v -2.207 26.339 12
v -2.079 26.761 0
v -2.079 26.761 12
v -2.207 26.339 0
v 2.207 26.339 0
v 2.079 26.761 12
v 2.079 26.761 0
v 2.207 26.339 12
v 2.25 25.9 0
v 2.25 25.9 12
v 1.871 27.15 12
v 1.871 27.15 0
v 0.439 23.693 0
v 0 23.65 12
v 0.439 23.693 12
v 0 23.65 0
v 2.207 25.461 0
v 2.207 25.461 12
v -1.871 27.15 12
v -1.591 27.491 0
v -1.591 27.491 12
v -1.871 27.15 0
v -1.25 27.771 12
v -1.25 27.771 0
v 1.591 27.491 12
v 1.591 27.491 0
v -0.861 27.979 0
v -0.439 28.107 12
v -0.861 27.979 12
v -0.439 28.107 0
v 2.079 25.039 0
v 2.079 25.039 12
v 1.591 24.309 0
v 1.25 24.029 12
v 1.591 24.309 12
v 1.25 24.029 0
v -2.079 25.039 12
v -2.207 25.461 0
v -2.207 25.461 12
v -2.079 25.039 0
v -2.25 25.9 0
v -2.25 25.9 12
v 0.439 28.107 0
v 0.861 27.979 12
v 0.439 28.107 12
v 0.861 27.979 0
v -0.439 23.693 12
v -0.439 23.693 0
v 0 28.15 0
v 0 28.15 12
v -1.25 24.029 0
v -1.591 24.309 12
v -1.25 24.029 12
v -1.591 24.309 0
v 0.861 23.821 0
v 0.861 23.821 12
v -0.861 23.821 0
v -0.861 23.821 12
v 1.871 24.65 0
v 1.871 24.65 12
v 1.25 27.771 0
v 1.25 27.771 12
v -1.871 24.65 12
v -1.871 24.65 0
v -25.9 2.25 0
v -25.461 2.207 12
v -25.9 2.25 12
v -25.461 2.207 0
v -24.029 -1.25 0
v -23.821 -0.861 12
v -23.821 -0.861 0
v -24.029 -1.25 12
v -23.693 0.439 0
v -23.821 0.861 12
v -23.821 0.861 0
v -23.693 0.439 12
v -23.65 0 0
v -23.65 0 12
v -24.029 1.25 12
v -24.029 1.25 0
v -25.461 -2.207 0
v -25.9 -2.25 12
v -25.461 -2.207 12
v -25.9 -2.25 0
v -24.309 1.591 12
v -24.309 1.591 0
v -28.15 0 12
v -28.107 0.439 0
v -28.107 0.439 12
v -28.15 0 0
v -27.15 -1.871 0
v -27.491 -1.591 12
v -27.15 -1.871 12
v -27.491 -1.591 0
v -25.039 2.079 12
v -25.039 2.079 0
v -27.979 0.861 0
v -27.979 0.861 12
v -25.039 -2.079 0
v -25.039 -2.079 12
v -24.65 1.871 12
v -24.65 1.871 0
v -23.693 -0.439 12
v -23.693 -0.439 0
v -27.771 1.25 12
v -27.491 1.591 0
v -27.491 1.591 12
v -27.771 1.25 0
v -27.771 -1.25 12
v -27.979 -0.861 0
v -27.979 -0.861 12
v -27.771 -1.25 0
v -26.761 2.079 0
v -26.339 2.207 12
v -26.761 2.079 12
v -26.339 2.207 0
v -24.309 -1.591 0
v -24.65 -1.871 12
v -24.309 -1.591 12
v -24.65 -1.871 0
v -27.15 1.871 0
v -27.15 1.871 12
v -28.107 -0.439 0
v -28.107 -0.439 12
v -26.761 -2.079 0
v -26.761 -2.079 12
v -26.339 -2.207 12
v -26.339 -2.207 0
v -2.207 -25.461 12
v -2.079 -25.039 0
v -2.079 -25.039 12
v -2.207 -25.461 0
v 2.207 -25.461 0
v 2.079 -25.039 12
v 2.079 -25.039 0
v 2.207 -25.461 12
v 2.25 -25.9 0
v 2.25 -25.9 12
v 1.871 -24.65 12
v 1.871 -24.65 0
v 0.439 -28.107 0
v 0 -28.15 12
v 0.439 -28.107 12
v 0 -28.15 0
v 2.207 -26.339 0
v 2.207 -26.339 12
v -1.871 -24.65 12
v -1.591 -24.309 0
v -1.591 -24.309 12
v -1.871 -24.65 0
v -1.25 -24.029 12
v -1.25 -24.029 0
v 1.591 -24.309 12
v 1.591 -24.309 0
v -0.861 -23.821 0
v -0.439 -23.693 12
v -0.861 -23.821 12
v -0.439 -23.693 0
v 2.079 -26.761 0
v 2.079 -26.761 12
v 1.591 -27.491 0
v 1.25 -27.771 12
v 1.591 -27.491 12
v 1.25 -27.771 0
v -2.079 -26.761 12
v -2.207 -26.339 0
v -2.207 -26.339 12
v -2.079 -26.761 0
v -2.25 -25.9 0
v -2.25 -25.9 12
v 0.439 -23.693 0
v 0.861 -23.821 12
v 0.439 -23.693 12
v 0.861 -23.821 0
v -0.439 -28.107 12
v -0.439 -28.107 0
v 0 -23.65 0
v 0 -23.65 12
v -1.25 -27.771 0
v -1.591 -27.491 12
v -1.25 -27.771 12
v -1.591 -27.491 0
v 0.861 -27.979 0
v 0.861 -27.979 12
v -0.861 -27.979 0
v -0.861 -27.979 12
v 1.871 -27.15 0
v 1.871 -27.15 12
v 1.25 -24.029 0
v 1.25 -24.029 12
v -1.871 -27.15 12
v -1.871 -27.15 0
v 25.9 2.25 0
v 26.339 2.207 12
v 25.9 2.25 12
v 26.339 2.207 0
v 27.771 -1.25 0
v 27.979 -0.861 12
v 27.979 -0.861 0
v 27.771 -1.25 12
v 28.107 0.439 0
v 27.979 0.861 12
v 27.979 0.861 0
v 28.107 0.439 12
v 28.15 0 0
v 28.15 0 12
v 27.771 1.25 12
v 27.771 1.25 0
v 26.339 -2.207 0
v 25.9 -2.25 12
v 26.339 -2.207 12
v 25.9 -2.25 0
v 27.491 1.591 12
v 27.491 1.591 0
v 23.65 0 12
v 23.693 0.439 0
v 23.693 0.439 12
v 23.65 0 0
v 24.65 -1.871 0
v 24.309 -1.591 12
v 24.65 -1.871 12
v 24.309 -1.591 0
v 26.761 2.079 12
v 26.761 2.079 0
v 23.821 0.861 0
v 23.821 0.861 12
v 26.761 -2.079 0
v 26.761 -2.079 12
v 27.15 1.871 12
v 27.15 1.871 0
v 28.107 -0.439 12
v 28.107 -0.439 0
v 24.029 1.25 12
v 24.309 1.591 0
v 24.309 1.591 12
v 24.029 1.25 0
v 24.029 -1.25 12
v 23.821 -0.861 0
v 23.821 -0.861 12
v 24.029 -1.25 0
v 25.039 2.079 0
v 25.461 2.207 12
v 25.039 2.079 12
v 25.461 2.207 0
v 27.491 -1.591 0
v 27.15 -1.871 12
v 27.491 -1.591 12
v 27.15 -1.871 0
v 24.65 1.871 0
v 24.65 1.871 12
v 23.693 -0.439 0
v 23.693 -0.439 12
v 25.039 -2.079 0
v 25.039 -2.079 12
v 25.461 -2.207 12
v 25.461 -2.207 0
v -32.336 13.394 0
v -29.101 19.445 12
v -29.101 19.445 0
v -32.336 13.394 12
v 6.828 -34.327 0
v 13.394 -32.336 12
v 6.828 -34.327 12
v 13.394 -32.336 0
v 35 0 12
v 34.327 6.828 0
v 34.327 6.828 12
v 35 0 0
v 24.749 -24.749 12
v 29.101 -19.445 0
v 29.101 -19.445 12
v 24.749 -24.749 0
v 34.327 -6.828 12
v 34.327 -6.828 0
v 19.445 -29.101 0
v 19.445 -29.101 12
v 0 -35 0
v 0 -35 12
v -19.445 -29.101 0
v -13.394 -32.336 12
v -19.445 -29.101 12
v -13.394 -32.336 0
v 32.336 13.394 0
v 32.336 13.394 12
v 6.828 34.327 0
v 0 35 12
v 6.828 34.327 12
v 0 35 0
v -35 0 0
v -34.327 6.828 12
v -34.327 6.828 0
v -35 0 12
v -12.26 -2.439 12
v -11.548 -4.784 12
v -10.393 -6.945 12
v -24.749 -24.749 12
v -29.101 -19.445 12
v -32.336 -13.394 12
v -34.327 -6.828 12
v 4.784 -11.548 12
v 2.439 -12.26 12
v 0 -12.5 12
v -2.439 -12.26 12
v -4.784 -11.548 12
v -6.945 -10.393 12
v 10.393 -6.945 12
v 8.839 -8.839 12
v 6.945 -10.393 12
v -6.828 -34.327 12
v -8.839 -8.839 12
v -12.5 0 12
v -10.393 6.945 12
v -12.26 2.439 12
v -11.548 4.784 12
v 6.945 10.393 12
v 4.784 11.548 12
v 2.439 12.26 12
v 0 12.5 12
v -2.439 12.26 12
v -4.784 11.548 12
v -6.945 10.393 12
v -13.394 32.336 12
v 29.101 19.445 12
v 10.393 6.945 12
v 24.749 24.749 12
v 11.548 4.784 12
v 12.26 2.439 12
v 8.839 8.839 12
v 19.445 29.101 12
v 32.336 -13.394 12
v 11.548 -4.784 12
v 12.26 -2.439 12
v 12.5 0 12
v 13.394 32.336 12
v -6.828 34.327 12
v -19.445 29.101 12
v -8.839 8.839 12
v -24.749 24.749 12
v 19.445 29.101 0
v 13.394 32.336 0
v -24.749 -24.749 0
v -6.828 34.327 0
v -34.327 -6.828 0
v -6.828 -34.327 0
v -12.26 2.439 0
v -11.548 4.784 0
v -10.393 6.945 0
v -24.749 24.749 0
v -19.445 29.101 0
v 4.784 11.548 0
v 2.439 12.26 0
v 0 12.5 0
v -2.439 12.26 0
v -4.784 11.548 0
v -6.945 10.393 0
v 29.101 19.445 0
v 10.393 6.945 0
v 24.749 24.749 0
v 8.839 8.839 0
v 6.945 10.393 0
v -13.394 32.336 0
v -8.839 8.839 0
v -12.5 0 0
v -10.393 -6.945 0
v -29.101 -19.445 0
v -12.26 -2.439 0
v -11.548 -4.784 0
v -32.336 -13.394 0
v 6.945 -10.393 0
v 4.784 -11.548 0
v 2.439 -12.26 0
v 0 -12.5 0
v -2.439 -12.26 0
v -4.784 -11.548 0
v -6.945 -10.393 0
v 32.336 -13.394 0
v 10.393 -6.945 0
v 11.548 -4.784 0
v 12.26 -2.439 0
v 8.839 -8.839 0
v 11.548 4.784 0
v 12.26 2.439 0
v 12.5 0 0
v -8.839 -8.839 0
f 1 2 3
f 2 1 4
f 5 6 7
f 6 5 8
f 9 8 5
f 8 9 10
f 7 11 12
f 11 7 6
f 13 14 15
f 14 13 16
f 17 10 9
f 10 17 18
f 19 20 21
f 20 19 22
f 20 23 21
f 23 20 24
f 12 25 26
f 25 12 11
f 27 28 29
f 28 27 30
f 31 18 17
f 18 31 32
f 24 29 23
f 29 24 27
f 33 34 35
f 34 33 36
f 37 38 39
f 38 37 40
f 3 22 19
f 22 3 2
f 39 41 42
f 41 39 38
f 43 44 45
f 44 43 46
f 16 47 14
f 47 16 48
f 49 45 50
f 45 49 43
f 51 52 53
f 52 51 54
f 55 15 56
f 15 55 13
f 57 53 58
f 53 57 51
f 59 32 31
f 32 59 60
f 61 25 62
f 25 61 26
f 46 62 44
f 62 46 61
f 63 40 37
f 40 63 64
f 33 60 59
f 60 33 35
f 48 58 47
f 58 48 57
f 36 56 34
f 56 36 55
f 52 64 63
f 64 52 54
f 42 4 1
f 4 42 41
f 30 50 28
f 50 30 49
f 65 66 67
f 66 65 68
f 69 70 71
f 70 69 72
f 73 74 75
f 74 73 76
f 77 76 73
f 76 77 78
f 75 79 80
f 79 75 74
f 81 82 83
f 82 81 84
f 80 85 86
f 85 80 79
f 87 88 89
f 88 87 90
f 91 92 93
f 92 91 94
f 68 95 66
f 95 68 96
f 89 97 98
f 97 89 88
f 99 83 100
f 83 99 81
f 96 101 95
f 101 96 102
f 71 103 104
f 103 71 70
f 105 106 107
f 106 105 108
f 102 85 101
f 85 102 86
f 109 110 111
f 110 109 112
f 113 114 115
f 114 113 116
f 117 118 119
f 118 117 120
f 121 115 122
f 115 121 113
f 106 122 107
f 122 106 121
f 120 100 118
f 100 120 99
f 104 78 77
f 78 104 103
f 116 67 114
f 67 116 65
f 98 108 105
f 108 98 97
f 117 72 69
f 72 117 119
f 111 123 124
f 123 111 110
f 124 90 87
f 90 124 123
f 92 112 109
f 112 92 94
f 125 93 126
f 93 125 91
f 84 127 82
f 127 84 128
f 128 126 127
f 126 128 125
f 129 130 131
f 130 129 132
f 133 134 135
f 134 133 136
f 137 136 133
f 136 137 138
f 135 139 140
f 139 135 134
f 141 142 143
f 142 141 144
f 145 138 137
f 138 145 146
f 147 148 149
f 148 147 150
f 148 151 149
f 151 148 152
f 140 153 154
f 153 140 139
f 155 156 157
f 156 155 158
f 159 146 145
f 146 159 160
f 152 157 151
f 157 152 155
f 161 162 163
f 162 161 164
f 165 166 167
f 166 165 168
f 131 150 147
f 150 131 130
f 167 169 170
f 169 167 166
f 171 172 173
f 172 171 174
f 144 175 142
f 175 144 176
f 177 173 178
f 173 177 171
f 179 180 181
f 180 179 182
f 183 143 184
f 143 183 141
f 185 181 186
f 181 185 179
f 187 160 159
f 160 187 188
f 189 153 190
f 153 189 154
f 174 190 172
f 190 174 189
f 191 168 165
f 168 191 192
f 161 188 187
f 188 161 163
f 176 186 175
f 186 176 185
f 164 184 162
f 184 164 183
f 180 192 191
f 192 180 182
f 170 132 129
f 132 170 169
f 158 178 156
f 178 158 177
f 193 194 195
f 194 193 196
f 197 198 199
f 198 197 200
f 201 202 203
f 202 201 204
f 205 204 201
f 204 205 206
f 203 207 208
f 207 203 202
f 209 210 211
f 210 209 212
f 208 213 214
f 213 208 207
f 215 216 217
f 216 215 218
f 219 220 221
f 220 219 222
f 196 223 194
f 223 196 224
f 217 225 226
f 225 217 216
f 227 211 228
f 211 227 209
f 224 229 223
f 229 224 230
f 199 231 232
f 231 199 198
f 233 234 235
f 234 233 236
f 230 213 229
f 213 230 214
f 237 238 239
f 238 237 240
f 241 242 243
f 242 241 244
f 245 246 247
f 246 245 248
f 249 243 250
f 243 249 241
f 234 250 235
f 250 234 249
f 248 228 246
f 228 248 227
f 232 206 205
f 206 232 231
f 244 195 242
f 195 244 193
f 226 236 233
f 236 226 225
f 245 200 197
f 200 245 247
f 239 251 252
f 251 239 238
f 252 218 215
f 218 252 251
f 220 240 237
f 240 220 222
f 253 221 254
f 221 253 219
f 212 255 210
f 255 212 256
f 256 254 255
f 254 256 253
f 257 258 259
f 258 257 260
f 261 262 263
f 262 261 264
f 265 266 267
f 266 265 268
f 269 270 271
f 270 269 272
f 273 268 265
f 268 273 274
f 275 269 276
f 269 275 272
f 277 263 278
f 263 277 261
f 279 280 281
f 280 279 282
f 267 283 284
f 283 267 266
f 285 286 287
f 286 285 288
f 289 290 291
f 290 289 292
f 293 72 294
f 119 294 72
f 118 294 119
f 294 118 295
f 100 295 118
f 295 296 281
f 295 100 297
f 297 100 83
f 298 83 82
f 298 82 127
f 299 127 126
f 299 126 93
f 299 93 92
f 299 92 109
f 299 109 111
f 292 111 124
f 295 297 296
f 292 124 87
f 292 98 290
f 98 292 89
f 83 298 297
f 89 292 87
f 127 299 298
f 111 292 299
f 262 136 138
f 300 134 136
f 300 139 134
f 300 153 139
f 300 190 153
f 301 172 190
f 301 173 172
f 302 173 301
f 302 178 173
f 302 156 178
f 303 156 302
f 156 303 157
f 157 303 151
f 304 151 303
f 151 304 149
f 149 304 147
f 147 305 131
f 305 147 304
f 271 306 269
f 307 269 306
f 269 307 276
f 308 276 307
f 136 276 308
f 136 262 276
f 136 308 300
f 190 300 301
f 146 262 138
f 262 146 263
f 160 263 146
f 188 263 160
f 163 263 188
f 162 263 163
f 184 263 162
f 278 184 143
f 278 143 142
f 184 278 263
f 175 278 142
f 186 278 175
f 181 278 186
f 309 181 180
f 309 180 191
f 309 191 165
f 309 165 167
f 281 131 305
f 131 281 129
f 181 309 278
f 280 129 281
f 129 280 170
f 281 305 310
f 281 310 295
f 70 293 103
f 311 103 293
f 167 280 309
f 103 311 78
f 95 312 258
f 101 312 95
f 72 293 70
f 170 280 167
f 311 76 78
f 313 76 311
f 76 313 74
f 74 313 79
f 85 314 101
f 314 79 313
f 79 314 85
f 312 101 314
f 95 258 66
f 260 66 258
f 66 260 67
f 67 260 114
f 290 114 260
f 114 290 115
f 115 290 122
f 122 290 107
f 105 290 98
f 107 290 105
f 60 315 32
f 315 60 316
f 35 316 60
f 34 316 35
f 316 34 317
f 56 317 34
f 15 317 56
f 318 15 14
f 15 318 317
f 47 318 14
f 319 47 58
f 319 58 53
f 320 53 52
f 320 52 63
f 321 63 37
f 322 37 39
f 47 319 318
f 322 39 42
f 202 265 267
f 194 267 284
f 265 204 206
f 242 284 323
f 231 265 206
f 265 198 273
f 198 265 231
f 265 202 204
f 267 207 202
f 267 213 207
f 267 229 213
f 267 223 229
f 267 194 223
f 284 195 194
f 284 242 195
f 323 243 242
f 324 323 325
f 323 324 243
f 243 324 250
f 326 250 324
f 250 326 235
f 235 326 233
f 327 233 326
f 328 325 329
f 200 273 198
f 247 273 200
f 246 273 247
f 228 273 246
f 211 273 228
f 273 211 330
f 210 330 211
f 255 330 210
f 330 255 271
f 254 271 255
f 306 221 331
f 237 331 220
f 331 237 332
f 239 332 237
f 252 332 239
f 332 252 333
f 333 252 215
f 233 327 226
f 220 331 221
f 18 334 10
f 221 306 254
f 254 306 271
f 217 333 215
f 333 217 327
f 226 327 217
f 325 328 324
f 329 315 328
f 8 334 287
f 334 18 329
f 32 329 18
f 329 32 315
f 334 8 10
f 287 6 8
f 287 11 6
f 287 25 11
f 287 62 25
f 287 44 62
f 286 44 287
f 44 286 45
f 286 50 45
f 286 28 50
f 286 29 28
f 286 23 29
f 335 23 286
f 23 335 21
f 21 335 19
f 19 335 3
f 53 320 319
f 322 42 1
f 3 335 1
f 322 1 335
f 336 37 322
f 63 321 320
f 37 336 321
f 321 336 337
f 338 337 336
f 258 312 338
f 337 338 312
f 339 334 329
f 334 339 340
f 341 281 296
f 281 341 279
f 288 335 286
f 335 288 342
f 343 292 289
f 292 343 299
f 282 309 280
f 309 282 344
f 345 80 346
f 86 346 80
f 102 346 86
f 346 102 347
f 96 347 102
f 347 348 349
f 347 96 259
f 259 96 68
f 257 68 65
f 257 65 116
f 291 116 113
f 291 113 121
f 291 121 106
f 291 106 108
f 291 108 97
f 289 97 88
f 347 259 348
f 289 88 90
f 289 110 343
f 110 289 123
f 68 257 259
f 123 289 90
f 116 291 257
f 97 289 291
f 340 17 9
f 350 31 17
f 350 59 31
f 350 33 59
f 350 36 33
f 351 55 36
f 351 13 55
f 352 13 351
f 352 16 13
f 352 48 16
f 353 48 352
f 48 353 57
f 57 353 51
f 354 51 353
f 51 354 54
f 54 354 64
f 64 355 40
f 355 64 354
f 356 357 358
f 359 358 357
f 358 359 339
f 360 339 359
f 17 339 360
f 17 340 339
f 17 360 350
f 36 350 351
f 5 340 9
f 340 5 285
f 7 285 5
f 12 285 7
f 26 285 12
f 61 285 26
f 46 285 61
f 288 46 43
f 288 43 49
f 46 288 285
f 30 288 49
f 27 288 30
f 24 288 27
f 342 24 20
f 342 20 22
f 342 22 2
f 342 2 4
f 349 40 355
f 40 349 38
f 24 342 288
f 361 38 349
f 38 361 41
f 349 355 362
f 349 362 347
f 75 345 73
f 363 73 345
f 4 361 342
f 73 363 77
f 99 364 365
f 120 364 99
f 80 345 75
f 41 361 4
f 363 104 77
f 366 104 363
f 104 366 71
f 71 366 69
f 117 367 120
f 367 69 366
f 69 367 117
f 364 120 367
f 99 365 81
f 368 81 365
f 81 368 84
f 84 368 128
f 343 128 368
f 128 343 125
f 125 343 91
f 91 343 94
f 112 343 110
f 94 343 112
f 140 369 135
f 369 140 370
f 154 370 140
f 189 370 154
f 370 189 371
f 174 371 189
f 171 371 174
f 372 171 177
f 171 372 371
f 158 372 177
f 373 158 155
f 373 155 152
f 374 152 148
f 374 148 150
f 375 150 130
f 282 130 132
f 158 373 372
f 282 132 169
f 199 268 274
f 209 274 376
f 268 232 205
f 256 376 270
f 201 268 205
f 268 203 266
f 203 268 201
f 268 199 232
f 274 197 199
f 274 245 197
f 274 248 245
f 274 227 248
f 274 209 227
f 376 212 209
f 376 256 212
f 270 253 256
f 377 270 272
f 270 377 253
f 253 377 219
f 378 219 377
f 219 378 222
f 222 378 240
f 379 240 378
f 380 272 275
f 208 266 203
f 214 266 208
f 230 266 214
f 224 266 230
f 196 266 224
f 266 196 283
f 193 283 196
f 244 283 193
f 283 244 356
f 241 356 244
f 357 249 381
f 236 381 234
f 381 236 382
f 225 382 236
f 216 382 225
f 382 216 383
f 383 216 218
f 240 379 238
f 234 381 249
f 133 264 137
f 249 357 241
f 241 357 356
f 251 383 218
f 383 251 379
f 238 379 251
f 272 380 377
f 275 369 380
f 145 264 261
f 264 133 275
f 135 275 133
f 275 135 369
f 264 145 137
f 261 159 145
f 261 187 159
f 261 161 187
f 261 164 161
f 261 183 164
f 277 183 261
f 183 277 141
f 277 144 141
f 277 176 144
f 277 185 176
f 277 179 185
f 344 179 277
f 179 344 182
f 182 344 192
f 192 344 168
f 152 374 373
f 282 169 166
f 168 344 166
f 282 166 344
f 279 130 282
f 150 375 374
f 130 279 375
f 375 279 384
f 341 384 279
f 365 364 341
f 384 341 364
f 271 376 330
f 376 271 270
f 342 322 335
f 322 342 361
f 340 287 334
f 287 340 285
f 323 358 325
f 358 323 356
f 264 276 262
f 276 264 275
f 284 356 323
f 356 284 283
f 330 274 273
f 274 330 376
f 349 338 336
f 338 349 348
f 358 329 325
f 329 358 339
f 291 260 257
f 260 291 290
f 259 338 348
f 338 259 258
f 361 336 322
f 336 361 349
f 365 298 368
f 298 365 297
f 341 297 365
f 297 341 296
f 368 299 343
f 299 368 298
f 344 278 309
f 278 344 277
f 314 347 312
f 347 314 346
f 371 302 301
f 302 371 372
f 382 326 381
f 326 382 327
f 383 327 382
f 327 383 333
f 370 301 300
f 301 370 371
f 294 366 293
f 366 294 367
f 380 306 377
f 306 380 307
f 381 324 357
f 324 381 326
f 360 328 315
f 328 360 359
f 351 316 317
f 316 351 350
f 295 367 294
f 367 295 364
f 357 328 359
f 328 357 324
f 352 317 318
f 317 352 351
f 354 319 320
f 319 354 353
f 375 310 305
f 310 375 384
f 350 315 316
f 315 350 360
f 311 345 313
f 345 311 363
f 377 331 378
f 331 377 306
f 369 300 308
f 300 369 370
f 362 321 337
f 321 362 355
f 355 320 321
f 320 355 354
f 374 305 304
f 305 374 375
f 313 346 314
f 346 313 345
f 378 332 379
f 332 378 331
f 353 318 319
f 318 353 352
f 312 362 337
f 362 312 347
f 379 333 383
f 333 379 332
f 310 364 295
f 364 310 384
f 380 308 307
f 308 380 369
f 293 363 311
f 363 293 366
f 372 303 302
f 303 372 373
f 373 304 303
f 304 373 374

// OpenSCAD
$fn = 32;

// ----------------------------------------------------------------------
// Flange Ø70 x 12
// 4 holes on a Ø51.8 bolt circle, bolted joints
// ----------------------------------------------------------------------

// --- parameters (mm) ---
flange_d = 70;   // outside diameter of the flange
thickness = 12;  // flange thickness
holes = 4;       // number of bolt holes
pcd = 51.8;      // bolt circle diameter
start_deg = 90;  // angle of the first hole, from +X
hole_d = 4.5;    // bolt hole diameter
bore_d = 25;     // central through bore
hub_d = 33;      // hub outside diameter
hub_h = 0;       // hub height above the flange face (0 = no hub)

// --- derived feature positions (mm) ---
height = thickness + hub_h;  // = 12   overall height of the part
pcd_r = pcd / 2;             // = 25.9   bolt circle radius
hole_step = 360 / holes;     // = 90   angular pitch
feature_centers = [
  [pcd_r * cos(start_deg + 0 * hole_step), pcd_r * sin(start_deg + 0 * hole_step)],
  [pcd_r * cos(start_deg + 1 * hole_step), pcd_r * sin(start_deg + 1 * hole_step)],
  [pcd_r * cos(start_deg + 2 * hole_step), pcd_r * sin(start_deg + 2 * hole_step)],
  [pcd_r * cos(start_deg + 3 * hole_step), pcd_r * sin(start_deg + 3 * hole_step)]
];   // bolt hole centres on the pitch circle

// flange disc, every hole and the bore cut straight through
difference() {
  union() {
    cylinder(d = flange_d, h = thickness);
  }
  translate([0, 0, -1]) cylinder(d = bore_d, h = height + 2);  // bore, through
  for (centre = feature_centers)
    translate([centre[0], centre[1], -1]) cylinder(d = hole_d, h = thickness + 2);
}
